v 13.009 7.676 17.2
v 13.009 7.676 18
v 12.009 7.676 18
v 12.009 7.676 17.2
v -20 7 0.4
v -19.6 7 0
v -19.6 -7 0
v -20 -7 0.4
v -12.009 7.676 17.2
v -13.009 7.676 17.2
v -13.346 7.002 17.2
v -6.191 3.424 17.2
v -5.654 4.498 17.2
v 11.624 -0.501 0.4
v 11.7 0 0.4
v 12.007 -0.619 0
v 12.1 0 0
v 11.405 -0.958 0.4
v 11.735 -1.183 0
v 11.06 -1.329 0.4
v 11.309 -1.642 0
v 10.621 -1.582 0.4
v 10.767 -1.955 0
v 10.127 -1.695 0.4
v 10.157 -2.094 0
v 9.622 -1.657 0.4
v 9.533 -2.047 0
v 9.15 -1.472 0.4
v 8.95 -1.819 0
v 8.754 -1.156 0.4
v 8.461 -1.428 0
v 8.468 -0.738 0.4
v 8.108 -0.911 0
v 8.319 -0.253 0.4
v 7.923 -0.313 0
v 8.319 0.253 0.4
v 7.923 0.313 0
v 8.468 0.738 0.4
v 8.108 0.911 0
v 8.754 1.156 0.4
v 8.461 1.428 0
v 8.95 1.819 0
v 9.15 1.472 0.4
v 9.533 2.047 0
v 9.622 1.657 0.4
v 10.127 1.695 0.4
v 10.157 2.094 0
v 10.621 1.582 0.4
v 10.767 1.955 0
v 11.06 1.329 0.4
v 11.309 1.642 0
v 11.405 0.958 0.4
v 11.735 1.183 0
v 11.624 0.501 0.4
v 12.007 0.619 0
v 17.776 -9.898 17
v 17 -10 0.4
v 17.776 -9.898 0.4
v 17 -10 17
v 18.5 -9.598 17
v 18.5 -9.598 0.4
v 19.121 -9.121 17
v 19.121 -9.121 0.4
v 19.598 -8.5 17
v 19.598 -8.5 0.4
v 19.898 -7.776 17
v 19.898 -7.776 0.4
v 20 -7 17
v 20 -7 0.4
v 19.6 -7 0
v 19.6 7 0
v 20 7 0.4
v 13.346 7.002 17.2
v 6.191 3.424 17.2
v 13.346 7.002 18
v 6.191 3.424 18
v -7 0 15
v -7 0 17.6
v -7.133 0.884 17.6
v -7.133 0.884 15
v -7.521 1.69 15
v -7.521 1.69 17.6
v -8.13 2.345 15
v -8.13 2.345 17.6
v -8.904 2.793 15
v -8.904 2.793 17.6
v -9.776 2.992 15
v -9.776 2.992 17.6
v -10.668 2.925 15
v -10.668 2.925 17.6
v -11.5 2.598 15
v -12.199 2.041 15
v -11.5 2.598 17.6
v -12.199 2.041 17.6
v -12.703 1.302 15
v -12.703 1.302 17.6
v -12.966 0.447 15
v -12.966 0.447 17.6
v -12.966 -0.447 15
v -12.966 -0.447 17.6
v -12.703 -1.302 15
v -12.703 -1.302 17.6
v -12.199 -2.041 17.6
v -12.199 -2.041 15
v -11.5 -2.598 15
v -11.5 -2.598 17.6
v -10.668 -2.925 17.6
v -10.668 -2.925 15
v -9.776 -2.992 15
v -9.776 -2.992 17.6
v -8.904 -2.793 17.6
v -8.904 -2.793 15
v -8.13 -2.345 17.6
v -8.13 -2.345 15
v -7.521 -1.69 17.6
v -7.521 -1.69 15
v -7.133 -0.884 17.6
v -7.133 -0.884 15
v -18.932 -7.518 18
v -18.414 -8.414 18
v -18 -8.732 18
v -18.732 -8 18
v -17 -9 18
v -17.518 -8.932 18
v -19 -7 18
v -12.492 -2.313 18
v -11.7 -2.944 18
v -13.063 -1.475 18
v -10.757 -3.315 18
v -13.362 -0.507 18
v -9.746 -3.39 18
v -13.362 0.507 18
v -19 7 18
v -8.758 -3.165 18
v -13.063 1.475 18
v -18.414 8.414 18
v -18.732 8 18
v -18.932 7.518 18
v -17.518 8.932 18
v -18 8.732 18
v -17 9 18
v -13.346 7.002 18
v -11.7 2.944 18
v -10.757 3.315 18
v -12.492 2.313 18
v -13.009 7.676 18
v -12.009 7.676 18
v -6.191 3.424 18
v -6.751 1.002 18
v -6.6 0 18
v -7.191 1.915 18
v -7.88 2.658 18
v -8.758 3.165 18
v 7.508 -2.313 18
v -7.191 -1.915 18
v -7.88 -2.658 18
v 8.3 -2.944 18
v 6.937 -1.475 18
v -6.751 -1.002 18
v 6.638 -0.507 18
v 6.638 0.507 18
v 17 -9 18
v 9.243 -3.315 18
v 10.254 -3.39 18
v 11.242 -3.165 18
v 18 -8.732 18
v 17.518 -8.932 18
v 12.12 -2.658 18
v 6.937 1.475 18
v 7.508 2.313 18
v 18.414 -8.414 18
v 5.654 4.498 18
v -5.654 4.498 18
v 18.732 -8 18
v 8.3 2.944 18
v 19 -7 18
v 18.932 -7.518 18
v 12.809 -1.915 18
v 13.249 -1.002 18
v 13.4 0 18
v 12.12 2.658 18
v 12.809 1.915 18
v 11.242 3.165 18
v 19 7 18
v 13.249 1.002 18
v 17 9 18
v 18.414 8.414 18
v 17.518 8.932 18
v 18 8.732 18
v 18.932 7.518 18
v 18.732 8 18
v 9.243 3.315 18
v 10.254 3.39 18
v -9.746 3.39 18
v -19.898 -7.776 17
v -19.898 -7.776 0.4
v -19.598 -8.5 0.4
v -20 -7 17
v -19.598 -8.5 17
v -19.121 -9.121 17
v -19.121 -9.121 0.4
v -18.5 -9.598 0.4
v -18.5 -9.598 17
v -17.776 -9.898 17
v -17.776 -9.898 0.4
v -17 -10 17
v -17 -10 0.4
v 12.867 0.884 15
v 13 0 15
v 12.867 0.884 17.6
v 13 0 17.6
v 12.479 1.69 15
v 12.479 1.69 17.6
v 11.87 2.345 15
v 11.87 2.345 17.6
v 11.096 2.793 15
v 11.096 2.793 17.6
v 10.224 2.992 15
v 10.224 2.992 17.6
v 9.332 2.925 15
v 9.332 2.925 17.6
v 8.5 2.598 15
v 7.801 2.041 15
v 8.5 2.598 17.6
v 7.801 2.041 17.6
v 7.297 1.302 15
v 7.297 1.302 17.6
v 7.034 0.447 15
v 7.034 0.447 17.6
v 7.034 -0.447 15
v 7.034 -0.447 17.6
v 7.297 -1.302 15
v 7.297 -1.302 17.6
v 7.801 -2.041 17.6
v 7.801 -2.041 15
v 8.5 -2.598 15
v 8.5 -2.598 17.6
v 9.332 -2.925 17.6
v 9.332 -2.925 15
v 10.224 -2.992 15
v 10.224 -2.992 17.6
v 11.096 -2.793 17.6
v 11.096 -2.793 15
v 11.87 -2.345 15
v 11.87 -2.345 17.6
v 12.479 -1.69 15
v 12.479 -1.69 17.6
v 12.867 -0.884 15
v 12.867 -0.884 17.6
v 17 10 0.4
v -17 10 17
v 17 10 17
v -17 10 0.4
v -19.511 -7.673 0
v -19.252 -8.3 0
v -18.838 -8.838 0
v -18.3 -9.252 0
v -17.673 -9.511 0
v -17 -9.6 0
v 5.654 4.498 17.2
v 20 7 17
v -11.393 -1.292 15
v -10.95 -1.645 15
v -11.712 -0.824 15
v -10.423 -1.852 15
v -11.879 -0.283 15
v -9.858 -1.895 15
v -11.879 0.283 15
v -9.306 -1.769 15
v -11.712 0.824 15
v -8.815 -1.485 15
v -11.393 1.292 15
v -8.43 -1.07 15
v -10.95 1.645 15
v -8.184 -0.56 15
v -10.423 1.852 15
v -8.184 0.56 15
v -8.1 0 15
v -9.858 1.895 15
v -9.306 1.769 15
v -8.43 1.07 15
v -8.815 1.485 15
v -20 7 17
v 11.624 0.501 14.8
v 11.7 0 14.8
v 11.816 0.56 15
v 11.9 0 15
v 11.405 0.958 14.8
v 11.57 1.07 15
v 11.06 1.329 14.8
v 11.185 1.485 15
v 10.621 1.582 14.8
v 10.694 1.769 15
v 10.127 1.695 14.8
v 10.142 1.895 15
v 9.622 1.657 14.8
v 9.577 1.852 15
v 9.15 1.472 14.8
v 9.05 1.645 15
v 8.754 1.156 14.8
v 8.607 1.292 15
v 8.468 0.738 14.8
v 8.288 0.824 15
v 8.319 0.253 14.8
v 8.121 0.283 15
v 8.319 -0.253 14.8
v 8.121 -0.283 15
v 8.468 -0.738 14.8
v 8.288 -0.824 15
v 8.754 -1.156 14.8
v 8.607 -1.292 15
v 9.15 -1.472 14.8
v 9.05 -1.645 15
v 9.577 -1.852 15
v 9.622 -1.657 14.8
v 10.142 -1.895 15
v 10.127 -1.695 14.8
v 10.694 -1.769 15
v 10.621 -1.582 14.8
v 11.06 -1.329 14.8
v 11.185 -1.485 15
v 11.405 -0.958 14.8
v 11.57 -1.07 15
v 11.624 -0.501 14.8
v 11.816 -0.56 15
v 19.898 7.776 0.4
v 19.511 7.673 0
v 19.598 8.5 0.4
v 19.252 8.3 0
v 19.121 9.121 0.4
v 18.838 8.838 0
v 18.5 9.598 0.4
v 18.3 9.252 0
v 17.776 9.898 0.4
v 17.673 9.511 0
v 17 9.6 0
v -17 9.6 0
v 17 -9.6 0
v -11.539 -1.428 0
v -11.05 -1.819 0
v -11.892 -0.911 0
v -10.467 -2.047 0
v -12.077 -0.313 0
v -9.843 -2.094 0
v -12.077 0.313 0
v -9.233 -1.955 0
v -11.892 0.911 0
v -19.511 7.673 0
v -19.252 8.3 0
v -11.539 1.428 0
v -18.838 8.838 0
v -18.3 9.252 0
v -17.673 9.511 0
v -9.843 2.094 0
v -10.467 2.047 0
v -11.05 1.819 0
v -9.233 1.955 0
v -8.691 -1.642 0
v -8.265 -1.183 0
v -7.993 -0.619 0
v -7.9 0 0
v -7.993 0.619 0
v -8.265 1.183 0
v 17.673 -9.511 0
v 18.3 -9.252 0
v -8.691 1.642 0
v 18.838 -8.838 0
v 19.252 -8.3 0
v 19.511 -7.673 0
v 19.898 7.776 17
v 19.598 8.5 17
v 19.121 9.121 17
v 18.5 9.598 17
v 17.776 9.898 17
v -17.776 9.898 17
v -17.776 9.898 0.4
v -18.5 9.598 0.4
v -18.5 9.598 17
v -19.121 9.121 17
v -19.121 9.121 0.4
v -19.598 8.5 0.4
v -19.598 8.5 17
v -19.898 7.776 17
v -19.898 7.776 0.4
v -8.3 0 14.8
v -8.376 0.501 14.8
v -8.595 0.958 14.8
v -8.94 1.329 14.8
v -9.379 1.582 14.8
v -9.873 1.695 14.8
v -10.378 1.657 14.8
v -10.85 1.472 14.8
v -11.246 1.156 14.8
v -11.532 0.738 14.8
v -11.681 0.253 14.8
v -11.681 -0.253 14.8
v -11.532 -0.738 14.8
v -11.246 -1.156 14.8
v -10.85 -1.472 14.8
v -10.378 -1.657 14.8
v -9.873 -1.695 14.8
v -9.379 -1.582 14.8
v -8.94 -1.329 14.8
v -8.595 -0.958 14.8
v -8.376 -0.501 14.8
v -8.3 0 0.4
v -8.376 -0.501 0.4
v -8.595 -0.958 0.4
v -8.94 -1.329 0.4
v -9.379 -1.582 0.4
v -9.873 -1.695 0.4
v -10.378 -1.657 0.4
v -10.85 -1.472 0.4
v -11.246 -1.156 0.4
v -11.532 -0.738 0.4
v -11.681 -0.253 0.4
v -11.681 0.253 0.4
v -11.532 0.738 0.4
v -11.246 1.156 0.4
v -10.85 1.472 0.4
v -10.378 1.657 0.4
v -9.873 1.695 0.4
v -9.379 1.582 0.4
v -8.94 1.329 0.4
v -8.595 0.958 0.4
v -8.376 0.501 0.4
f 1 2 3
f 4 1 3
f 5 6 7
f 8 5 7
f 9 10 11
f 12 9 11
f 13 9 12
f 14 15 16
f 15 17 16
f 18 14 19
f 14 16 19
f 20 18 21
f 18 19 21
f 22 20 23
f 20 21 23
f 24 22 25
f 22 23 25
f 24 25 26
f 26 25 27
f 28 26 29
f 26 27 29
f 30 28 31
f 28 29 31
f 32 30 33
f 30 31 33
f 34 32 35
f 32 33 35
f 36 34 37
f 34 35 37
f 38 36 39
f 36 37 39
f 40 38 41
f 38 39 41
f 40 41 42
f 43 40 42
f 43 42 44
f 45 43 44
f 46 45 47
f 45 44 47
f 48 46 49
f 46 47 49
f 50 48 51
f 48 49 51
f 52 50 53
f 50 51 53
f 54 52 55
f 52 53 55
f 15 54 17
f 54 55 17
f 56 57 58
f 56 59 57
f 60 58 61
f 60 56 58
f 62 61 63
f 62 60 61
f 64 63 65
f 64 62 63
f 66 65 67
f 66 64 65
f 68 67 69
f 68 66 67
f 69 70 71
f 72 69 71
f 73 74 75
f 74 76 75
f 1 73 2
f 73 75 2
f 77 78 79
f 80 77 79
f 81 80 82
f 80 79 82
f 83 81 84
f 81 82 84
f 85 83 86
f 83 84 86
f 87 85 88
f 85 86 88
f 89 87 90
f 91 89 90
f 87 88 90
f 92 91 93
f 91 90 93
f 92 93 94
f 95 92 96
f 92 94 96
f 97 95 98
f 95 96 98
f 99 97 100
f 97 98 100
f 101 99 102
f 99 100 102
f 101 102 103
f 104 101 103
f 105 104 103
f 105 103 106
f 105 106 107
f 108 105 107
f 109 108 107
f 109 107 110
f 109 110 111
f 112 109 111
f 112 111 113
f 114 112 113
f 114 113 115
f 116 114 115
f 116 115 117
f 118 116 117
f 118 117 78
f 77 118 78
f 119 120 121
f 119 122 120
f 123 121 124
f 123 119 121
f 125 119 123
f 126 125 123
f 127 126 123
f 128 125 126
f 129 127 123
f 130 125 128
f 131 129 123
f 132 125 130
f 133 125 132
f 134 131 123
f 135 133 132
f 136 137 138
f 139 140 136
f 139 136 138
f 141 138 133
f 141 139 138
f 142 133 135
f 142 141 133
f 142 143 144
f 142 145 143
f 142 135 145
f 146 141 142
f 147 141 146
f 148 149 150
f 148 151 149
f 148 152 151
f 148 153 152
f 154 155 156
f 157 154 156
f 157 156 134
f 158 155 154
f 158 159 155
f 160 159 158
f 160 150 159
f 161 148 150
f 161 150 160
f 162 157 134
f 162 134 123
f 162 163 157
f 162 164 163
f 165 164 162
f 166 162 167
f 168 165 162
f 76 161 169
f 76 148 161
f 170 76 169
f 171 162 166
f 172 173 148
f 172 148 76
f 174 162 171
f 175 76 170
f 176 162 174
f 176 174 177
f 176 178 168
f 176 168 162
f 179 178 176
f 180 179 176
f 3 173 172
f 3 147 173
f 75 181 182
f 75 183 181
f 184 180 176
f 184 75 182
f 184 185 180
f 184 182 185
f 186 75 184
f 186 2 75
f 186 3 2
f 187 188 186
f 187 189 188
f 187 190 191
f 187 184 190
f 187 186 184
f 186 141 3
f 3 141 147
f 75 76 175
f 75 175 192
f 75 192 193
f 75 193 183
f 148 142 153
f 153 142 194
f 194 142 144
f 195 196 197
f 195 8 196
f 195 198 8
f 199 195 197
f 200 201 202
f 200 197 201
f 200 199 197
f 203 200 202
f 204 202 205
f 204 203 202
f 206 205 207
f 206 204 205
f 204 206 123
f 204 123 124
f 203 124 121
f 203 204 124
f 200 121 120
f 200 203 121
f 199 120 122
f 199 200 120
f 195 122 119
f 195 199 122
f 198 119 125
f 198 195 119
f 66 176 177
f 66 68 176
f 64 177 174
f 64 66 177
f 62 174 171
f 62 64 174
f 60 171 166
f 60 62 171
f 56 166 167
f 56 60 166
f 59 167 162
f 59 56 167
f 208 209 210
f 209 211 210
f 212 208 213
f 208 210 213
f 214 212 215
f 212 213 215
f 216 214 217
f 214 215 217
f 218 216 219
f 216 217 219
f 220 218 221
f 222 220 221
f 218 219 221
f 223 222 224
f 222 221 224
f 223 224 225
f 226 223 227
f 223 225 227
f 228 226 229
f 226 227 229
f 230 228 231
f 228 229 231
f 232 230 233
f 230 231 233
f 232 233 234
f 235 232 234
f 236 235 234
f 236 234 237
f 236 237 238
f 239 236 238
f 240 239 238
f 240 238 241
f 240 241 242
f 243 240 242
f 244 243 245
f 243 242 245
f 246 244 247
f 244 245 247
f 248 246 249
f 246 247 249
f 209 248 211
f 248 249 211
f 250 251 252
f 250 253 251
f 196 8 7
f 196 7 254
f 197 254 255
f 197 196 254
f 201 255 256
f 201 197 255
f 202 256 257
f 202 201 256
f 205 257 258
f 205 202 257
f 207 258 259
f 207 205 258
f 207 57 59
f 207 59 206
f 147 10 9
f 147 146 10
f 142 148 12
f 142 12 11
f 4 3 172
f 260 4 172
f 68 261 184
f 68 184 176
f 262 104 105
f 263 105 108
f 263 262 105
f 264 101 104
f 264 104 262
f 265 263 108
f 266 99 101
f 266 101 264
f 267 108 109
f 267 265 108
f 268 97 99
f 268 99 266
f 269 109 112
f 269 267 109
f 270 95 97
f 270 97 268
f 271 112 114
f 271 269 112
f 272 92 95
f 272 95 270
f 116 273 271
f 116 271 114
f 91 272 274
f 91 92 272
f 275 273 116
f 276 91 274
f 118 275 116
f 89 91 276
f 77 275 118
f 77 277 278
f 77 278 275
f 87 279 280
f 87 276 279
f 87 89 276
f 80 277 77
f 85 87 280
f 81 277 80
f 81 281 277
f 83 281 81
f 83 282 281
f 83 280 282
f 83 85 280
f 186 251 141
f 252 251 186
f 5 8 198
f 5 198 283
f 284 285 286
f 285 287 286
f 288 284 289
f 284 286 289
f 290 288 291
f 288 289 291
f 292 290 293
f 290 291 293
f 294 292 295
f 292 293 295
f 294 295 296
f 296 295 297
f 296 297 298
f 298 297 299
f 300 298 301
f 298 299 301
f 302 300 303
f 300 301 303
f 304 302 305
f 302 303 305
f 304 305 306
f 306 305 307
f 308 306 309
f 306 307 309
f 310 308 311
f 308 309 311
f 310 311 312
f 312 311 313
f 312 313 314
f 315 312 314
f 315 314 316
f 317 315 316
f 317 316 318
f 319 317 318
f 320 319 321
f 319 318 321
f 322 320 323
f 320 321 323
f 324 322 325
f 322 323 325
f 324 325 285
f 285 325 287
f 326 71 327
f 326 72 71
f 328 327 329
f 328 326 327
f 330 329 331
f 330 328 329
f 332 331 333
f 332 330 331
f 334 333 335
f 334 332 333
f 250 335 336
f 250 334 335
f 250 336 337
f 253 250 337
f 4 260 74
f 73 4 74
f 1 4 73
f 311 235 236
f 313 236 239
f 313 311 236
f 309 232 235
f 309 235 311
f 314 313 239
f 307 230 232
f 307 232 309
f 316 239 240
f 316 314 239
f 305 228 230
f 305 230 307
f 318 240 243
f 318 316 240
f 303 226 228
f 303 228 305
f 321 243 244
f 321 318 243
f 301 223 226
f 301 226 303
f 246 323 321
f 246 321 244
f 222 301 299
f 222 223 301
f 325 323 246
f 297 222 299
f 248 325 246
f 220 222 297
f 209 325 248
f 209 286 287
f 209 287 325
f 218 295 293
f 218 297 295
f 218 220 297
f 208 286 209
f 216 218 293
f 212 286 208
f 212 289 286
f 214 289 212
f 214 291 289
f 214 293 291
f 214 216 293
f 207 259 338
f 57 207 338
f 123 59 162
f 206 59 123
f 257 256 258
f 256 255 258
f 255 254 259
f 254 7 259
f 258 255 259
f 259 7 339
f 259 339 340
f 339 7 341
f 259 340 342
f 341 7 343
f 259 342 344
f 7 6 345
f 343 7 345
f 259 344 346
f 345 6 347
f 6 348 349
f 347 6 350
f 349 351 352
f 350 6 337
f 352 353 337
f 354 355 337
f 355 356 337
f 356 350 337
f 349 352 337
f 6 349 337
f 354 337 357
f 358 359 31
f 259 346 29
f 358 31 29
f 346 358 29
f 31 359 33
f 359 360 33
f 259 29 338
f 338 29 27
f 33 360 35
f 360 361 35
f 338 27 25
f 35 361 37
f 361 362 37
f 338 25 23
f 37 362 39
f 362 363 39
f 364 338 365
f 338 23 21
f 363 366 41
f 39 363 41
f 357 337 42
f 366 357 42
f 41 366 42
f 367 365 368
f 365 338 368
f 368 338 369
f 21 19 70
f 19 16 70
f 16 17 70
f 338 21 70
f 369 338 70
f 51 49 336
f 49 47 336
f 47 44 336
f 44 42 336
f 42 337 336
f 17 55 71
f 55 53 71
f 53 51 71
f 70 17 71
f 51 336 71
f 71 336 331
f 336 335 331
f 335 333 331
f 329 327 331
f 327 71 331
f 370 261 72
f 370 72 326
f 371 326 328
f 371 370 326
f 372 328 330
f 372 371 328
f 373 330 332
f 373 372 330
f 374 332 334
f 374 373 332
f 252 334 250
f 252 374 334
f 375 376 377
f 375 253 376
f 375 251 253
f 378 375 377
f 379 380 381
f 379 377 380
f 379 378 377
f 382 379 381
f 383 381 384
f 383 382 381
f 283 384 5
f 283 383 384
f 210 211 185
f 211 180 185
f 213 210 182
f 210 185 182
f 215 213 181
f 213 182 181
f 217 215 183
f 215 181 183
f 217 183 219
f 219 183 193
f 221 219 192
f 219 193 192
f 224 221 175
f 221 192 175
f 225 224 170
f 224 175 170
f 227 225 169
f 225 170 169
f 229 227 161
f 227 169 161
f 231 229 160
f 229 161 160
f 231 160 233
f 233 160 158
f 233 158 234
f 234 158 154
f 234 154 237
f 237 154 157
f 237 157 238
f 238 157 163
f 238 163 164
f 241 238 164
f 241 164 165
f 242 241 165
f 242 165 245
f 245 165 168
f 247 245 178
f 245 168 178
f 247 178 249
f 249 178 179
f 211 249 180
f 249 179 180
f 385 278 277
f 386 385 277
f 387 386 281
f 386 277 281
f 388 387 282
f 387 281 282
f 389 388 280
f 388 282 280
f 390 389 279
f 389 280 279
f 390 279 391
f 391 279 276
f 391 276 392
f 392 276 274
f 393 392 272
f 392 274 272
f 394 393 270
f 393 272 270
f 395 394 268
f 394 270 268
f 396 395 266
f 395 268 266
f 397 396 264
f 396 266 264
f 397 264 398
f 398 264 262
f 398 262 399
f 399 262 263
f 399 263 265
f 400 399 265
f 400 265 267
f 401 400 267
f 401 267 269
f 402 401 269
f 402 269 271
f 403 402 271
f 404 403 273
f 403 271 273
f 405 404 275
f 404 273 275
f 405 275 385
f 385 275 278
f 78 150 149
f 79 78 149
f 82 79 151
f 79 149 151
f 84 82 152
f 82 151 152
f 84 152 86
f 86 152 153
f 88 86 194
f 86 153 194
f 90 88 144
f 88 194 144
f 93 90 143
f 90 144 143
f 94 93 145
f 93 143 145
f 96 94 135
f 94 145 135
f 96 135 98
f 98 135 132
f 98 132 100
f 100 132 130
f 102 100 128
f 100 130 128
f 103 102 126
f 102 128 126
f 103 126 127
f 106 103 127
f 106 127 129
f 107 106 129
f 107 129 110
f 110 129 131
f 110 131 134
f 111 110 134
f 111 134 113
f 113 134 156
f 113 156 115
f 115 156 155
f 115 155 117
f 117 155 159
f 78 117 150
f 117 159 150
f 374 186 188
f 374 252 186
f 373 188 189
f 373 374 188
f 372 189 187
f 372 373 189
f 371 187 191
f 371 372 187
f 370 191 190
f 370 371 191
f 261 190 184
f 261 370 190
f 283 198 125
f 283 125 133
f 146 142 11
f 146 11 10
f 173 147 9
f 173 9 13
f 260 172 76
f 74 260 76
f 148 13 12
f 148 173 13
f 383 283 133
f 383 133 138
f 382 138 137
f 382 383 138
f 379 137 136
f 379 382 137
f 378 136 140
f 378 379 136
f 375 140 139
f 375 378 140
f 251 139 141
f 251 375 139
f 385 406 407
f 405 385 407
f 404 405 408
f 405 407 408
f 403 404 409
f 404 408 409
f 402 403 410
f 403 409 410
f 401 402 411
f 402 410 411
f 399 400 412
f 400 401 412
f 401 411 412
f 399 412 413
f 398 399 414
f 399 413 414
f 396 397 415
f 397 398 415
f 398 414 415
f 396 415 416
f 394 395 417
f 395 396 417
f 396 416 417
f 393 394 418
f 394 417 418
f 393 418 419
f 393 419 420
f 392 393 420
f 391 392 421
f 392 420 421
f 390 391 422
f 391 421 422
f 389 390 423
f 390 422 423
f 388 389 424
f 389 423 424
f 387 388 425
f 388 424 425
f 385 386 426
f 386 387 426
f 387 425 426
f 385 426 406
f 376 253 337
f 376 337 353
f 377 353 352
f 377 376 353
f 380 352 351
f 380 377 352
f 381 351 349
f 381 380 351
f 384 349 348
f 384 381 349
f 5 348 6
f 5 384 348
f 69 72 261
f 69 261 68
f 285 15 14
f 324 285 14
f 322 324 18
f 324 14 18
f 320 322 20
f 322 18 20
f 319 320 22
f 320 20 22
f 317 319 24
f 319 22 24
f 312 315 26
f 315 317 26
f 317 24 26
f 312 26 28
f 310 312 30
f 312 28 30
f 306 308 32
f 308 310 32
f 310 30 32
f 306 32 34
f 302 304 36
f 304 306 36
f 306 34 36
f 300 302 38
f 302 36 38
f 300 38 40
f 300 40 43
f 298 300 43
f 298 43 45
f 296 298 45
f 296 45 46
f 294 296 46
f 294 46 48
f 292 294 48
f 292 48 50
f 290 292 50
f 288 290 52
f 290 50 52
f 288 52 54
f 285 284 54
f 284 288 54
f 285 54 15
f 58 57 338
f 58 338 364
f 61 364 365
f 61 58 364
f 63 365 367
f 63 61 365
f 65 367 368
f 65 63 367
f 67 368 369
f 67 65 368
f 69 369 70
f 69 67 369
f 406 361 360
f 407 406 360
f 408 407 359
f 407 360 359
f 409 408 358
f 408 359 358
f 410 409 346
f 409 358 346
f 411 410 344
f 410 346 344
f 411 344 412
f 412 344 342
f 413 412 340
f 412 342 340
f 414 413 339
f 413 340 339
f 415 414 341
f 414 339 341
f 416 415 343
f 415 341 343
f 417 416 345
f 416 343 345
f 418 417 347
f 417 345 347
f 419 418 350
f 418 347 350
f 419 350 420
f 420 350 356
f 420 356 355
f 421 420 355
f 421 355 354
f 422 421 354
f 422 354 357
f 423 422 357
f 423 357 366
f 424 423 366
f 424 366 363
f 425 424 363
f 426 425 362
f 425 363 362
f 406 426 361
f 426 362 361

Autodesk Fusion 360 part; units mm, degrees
sketch "Sketch1" plane through (0, 0, 0) normal (0, 0, 1) x (1, 0, 0)
  line L0 (20, -10) -> (-20, -10)
  line L1 (-20, -10) -> (-20, 10)
  line L2 (-20, 10) -> (20, 10)
  line L3 (20, 10) -> (20, -10)
  line L4 (20, -10) -> (-20, 10) construction
  line L5 (-20, -10) -> (20, 10) construction
  line L6 (-20, 0) -> (20, 0) construction
  circle A0 centre (-10, 0) radius 1.7
  circle A1 centre (-10, 0) radius 3
  line L7 (0, 10) -> (0, -10) construction
  circle A2 centre (10, 0) radius 1.7
  circle A3 centre (10, 0) radius 3
  line L8 (-6.1906, 3.4245) -> (-13.346, 7.0022)
  line L9 (-13.346, 7.0022) -> (-12.8094, 8.0755)
  line L10 (-12.8094, 8.0755) -> (-5.654, 4.4978)
  line L11 (-5.654, 4.4978) -> (-6.1906, 3.4245)
  line L12 (-6.1906, 3.4245) -> (-12.8094, 8.0755) construction
  line L13 (-13.346, 7.0022) -> (-5.654, 4.4978) construction
  line L14 (6.1906, 3.4245) -> (13.346, 7.0022)
  line L15 (13.346, 7.0022) -> (12.8094, 8.0755)
  line L16 (12.8094, 8.0755) -> (5.654, 4.4978)
  line L17 (5.654, 4.4978) -> (6.1906, 3.4245)
  line L18 (-13.0094, 7.6755) -> (-12.0094, 7.6755)
  line L19 (13.0094, 7.6755) -> (12.0094, 7.6755)
  point P0 (-9.5, 5.75)
  dimension "d1" = 40
  dimension "d2" = 20
  dimension "d3" = 3.4
  dimension "d4" = 6
  dimension "d5" = 10
  dimension "d17" = 8
  dimension "d18" = 1.2
  dimension "d19" = 9.5
  dimension "d20" = 4.25
  dimension "d24" = 0.4
extrude "Extrude1" add sketch "Sketch1" along normal blind 18 contours L0 L1 L2 L3 | A1 | A3 | L8 L9 L10 L11 L18 | L9 L10 L18 | L14 L15 L16 L17 L19 | L15 L16 L19
extrude "Extrude2" cut sketch "Sketch1" against normal blind 3 from surface at 18 contours A1 | A3
fillet "Fillet1" radius 3 4 edges at (-20, 10, 9) (-20, -10, 9) (20, -10, 9) (20, 10, 9)
chamfer "Chamfer1" distance 1 angle 45 8 edges at (0, 10, 18) (-19.1213, 9.1213, 18) (-20, 0, 18) (-19.1213, -9.1213, 18) (0, -10, 18) (19.1213, -9.1213, 18) (20, 0, 18) (19.1213, 9.1213, 18)
chamfer "Chamfer2" distance 0.4 angle 45 10 edges at (7.203, 1.0848, 18) (-12.797, 1.0848, 18) (0, -10, 0) (-19.1213, -9.1213, 0) (-20, 0, 0) (-19.1213, 9.1213, 0) (0, 10, 0) (19.1213, 9.1213, 0) (20, 0, 0) (19.1213, -9.1213, 0)
chamfer "Chamfer3" distance 0.2 angle 45 2 edges at (-11.585, -0.6147, 15) (8.415, -0.6147, 15)
chamfer "Chamfer4" distance 0.4 angle 45 2 edges at (-11.585, 0.6147, 0) (8.415, 0.6147, 0)
extrude "Extrude3" cut sketch "Sketch1" against normal blind 0.8 from surface at 18 contours L8 L9 L10 L11 L18 | L14 L15 L16 L17 L19
